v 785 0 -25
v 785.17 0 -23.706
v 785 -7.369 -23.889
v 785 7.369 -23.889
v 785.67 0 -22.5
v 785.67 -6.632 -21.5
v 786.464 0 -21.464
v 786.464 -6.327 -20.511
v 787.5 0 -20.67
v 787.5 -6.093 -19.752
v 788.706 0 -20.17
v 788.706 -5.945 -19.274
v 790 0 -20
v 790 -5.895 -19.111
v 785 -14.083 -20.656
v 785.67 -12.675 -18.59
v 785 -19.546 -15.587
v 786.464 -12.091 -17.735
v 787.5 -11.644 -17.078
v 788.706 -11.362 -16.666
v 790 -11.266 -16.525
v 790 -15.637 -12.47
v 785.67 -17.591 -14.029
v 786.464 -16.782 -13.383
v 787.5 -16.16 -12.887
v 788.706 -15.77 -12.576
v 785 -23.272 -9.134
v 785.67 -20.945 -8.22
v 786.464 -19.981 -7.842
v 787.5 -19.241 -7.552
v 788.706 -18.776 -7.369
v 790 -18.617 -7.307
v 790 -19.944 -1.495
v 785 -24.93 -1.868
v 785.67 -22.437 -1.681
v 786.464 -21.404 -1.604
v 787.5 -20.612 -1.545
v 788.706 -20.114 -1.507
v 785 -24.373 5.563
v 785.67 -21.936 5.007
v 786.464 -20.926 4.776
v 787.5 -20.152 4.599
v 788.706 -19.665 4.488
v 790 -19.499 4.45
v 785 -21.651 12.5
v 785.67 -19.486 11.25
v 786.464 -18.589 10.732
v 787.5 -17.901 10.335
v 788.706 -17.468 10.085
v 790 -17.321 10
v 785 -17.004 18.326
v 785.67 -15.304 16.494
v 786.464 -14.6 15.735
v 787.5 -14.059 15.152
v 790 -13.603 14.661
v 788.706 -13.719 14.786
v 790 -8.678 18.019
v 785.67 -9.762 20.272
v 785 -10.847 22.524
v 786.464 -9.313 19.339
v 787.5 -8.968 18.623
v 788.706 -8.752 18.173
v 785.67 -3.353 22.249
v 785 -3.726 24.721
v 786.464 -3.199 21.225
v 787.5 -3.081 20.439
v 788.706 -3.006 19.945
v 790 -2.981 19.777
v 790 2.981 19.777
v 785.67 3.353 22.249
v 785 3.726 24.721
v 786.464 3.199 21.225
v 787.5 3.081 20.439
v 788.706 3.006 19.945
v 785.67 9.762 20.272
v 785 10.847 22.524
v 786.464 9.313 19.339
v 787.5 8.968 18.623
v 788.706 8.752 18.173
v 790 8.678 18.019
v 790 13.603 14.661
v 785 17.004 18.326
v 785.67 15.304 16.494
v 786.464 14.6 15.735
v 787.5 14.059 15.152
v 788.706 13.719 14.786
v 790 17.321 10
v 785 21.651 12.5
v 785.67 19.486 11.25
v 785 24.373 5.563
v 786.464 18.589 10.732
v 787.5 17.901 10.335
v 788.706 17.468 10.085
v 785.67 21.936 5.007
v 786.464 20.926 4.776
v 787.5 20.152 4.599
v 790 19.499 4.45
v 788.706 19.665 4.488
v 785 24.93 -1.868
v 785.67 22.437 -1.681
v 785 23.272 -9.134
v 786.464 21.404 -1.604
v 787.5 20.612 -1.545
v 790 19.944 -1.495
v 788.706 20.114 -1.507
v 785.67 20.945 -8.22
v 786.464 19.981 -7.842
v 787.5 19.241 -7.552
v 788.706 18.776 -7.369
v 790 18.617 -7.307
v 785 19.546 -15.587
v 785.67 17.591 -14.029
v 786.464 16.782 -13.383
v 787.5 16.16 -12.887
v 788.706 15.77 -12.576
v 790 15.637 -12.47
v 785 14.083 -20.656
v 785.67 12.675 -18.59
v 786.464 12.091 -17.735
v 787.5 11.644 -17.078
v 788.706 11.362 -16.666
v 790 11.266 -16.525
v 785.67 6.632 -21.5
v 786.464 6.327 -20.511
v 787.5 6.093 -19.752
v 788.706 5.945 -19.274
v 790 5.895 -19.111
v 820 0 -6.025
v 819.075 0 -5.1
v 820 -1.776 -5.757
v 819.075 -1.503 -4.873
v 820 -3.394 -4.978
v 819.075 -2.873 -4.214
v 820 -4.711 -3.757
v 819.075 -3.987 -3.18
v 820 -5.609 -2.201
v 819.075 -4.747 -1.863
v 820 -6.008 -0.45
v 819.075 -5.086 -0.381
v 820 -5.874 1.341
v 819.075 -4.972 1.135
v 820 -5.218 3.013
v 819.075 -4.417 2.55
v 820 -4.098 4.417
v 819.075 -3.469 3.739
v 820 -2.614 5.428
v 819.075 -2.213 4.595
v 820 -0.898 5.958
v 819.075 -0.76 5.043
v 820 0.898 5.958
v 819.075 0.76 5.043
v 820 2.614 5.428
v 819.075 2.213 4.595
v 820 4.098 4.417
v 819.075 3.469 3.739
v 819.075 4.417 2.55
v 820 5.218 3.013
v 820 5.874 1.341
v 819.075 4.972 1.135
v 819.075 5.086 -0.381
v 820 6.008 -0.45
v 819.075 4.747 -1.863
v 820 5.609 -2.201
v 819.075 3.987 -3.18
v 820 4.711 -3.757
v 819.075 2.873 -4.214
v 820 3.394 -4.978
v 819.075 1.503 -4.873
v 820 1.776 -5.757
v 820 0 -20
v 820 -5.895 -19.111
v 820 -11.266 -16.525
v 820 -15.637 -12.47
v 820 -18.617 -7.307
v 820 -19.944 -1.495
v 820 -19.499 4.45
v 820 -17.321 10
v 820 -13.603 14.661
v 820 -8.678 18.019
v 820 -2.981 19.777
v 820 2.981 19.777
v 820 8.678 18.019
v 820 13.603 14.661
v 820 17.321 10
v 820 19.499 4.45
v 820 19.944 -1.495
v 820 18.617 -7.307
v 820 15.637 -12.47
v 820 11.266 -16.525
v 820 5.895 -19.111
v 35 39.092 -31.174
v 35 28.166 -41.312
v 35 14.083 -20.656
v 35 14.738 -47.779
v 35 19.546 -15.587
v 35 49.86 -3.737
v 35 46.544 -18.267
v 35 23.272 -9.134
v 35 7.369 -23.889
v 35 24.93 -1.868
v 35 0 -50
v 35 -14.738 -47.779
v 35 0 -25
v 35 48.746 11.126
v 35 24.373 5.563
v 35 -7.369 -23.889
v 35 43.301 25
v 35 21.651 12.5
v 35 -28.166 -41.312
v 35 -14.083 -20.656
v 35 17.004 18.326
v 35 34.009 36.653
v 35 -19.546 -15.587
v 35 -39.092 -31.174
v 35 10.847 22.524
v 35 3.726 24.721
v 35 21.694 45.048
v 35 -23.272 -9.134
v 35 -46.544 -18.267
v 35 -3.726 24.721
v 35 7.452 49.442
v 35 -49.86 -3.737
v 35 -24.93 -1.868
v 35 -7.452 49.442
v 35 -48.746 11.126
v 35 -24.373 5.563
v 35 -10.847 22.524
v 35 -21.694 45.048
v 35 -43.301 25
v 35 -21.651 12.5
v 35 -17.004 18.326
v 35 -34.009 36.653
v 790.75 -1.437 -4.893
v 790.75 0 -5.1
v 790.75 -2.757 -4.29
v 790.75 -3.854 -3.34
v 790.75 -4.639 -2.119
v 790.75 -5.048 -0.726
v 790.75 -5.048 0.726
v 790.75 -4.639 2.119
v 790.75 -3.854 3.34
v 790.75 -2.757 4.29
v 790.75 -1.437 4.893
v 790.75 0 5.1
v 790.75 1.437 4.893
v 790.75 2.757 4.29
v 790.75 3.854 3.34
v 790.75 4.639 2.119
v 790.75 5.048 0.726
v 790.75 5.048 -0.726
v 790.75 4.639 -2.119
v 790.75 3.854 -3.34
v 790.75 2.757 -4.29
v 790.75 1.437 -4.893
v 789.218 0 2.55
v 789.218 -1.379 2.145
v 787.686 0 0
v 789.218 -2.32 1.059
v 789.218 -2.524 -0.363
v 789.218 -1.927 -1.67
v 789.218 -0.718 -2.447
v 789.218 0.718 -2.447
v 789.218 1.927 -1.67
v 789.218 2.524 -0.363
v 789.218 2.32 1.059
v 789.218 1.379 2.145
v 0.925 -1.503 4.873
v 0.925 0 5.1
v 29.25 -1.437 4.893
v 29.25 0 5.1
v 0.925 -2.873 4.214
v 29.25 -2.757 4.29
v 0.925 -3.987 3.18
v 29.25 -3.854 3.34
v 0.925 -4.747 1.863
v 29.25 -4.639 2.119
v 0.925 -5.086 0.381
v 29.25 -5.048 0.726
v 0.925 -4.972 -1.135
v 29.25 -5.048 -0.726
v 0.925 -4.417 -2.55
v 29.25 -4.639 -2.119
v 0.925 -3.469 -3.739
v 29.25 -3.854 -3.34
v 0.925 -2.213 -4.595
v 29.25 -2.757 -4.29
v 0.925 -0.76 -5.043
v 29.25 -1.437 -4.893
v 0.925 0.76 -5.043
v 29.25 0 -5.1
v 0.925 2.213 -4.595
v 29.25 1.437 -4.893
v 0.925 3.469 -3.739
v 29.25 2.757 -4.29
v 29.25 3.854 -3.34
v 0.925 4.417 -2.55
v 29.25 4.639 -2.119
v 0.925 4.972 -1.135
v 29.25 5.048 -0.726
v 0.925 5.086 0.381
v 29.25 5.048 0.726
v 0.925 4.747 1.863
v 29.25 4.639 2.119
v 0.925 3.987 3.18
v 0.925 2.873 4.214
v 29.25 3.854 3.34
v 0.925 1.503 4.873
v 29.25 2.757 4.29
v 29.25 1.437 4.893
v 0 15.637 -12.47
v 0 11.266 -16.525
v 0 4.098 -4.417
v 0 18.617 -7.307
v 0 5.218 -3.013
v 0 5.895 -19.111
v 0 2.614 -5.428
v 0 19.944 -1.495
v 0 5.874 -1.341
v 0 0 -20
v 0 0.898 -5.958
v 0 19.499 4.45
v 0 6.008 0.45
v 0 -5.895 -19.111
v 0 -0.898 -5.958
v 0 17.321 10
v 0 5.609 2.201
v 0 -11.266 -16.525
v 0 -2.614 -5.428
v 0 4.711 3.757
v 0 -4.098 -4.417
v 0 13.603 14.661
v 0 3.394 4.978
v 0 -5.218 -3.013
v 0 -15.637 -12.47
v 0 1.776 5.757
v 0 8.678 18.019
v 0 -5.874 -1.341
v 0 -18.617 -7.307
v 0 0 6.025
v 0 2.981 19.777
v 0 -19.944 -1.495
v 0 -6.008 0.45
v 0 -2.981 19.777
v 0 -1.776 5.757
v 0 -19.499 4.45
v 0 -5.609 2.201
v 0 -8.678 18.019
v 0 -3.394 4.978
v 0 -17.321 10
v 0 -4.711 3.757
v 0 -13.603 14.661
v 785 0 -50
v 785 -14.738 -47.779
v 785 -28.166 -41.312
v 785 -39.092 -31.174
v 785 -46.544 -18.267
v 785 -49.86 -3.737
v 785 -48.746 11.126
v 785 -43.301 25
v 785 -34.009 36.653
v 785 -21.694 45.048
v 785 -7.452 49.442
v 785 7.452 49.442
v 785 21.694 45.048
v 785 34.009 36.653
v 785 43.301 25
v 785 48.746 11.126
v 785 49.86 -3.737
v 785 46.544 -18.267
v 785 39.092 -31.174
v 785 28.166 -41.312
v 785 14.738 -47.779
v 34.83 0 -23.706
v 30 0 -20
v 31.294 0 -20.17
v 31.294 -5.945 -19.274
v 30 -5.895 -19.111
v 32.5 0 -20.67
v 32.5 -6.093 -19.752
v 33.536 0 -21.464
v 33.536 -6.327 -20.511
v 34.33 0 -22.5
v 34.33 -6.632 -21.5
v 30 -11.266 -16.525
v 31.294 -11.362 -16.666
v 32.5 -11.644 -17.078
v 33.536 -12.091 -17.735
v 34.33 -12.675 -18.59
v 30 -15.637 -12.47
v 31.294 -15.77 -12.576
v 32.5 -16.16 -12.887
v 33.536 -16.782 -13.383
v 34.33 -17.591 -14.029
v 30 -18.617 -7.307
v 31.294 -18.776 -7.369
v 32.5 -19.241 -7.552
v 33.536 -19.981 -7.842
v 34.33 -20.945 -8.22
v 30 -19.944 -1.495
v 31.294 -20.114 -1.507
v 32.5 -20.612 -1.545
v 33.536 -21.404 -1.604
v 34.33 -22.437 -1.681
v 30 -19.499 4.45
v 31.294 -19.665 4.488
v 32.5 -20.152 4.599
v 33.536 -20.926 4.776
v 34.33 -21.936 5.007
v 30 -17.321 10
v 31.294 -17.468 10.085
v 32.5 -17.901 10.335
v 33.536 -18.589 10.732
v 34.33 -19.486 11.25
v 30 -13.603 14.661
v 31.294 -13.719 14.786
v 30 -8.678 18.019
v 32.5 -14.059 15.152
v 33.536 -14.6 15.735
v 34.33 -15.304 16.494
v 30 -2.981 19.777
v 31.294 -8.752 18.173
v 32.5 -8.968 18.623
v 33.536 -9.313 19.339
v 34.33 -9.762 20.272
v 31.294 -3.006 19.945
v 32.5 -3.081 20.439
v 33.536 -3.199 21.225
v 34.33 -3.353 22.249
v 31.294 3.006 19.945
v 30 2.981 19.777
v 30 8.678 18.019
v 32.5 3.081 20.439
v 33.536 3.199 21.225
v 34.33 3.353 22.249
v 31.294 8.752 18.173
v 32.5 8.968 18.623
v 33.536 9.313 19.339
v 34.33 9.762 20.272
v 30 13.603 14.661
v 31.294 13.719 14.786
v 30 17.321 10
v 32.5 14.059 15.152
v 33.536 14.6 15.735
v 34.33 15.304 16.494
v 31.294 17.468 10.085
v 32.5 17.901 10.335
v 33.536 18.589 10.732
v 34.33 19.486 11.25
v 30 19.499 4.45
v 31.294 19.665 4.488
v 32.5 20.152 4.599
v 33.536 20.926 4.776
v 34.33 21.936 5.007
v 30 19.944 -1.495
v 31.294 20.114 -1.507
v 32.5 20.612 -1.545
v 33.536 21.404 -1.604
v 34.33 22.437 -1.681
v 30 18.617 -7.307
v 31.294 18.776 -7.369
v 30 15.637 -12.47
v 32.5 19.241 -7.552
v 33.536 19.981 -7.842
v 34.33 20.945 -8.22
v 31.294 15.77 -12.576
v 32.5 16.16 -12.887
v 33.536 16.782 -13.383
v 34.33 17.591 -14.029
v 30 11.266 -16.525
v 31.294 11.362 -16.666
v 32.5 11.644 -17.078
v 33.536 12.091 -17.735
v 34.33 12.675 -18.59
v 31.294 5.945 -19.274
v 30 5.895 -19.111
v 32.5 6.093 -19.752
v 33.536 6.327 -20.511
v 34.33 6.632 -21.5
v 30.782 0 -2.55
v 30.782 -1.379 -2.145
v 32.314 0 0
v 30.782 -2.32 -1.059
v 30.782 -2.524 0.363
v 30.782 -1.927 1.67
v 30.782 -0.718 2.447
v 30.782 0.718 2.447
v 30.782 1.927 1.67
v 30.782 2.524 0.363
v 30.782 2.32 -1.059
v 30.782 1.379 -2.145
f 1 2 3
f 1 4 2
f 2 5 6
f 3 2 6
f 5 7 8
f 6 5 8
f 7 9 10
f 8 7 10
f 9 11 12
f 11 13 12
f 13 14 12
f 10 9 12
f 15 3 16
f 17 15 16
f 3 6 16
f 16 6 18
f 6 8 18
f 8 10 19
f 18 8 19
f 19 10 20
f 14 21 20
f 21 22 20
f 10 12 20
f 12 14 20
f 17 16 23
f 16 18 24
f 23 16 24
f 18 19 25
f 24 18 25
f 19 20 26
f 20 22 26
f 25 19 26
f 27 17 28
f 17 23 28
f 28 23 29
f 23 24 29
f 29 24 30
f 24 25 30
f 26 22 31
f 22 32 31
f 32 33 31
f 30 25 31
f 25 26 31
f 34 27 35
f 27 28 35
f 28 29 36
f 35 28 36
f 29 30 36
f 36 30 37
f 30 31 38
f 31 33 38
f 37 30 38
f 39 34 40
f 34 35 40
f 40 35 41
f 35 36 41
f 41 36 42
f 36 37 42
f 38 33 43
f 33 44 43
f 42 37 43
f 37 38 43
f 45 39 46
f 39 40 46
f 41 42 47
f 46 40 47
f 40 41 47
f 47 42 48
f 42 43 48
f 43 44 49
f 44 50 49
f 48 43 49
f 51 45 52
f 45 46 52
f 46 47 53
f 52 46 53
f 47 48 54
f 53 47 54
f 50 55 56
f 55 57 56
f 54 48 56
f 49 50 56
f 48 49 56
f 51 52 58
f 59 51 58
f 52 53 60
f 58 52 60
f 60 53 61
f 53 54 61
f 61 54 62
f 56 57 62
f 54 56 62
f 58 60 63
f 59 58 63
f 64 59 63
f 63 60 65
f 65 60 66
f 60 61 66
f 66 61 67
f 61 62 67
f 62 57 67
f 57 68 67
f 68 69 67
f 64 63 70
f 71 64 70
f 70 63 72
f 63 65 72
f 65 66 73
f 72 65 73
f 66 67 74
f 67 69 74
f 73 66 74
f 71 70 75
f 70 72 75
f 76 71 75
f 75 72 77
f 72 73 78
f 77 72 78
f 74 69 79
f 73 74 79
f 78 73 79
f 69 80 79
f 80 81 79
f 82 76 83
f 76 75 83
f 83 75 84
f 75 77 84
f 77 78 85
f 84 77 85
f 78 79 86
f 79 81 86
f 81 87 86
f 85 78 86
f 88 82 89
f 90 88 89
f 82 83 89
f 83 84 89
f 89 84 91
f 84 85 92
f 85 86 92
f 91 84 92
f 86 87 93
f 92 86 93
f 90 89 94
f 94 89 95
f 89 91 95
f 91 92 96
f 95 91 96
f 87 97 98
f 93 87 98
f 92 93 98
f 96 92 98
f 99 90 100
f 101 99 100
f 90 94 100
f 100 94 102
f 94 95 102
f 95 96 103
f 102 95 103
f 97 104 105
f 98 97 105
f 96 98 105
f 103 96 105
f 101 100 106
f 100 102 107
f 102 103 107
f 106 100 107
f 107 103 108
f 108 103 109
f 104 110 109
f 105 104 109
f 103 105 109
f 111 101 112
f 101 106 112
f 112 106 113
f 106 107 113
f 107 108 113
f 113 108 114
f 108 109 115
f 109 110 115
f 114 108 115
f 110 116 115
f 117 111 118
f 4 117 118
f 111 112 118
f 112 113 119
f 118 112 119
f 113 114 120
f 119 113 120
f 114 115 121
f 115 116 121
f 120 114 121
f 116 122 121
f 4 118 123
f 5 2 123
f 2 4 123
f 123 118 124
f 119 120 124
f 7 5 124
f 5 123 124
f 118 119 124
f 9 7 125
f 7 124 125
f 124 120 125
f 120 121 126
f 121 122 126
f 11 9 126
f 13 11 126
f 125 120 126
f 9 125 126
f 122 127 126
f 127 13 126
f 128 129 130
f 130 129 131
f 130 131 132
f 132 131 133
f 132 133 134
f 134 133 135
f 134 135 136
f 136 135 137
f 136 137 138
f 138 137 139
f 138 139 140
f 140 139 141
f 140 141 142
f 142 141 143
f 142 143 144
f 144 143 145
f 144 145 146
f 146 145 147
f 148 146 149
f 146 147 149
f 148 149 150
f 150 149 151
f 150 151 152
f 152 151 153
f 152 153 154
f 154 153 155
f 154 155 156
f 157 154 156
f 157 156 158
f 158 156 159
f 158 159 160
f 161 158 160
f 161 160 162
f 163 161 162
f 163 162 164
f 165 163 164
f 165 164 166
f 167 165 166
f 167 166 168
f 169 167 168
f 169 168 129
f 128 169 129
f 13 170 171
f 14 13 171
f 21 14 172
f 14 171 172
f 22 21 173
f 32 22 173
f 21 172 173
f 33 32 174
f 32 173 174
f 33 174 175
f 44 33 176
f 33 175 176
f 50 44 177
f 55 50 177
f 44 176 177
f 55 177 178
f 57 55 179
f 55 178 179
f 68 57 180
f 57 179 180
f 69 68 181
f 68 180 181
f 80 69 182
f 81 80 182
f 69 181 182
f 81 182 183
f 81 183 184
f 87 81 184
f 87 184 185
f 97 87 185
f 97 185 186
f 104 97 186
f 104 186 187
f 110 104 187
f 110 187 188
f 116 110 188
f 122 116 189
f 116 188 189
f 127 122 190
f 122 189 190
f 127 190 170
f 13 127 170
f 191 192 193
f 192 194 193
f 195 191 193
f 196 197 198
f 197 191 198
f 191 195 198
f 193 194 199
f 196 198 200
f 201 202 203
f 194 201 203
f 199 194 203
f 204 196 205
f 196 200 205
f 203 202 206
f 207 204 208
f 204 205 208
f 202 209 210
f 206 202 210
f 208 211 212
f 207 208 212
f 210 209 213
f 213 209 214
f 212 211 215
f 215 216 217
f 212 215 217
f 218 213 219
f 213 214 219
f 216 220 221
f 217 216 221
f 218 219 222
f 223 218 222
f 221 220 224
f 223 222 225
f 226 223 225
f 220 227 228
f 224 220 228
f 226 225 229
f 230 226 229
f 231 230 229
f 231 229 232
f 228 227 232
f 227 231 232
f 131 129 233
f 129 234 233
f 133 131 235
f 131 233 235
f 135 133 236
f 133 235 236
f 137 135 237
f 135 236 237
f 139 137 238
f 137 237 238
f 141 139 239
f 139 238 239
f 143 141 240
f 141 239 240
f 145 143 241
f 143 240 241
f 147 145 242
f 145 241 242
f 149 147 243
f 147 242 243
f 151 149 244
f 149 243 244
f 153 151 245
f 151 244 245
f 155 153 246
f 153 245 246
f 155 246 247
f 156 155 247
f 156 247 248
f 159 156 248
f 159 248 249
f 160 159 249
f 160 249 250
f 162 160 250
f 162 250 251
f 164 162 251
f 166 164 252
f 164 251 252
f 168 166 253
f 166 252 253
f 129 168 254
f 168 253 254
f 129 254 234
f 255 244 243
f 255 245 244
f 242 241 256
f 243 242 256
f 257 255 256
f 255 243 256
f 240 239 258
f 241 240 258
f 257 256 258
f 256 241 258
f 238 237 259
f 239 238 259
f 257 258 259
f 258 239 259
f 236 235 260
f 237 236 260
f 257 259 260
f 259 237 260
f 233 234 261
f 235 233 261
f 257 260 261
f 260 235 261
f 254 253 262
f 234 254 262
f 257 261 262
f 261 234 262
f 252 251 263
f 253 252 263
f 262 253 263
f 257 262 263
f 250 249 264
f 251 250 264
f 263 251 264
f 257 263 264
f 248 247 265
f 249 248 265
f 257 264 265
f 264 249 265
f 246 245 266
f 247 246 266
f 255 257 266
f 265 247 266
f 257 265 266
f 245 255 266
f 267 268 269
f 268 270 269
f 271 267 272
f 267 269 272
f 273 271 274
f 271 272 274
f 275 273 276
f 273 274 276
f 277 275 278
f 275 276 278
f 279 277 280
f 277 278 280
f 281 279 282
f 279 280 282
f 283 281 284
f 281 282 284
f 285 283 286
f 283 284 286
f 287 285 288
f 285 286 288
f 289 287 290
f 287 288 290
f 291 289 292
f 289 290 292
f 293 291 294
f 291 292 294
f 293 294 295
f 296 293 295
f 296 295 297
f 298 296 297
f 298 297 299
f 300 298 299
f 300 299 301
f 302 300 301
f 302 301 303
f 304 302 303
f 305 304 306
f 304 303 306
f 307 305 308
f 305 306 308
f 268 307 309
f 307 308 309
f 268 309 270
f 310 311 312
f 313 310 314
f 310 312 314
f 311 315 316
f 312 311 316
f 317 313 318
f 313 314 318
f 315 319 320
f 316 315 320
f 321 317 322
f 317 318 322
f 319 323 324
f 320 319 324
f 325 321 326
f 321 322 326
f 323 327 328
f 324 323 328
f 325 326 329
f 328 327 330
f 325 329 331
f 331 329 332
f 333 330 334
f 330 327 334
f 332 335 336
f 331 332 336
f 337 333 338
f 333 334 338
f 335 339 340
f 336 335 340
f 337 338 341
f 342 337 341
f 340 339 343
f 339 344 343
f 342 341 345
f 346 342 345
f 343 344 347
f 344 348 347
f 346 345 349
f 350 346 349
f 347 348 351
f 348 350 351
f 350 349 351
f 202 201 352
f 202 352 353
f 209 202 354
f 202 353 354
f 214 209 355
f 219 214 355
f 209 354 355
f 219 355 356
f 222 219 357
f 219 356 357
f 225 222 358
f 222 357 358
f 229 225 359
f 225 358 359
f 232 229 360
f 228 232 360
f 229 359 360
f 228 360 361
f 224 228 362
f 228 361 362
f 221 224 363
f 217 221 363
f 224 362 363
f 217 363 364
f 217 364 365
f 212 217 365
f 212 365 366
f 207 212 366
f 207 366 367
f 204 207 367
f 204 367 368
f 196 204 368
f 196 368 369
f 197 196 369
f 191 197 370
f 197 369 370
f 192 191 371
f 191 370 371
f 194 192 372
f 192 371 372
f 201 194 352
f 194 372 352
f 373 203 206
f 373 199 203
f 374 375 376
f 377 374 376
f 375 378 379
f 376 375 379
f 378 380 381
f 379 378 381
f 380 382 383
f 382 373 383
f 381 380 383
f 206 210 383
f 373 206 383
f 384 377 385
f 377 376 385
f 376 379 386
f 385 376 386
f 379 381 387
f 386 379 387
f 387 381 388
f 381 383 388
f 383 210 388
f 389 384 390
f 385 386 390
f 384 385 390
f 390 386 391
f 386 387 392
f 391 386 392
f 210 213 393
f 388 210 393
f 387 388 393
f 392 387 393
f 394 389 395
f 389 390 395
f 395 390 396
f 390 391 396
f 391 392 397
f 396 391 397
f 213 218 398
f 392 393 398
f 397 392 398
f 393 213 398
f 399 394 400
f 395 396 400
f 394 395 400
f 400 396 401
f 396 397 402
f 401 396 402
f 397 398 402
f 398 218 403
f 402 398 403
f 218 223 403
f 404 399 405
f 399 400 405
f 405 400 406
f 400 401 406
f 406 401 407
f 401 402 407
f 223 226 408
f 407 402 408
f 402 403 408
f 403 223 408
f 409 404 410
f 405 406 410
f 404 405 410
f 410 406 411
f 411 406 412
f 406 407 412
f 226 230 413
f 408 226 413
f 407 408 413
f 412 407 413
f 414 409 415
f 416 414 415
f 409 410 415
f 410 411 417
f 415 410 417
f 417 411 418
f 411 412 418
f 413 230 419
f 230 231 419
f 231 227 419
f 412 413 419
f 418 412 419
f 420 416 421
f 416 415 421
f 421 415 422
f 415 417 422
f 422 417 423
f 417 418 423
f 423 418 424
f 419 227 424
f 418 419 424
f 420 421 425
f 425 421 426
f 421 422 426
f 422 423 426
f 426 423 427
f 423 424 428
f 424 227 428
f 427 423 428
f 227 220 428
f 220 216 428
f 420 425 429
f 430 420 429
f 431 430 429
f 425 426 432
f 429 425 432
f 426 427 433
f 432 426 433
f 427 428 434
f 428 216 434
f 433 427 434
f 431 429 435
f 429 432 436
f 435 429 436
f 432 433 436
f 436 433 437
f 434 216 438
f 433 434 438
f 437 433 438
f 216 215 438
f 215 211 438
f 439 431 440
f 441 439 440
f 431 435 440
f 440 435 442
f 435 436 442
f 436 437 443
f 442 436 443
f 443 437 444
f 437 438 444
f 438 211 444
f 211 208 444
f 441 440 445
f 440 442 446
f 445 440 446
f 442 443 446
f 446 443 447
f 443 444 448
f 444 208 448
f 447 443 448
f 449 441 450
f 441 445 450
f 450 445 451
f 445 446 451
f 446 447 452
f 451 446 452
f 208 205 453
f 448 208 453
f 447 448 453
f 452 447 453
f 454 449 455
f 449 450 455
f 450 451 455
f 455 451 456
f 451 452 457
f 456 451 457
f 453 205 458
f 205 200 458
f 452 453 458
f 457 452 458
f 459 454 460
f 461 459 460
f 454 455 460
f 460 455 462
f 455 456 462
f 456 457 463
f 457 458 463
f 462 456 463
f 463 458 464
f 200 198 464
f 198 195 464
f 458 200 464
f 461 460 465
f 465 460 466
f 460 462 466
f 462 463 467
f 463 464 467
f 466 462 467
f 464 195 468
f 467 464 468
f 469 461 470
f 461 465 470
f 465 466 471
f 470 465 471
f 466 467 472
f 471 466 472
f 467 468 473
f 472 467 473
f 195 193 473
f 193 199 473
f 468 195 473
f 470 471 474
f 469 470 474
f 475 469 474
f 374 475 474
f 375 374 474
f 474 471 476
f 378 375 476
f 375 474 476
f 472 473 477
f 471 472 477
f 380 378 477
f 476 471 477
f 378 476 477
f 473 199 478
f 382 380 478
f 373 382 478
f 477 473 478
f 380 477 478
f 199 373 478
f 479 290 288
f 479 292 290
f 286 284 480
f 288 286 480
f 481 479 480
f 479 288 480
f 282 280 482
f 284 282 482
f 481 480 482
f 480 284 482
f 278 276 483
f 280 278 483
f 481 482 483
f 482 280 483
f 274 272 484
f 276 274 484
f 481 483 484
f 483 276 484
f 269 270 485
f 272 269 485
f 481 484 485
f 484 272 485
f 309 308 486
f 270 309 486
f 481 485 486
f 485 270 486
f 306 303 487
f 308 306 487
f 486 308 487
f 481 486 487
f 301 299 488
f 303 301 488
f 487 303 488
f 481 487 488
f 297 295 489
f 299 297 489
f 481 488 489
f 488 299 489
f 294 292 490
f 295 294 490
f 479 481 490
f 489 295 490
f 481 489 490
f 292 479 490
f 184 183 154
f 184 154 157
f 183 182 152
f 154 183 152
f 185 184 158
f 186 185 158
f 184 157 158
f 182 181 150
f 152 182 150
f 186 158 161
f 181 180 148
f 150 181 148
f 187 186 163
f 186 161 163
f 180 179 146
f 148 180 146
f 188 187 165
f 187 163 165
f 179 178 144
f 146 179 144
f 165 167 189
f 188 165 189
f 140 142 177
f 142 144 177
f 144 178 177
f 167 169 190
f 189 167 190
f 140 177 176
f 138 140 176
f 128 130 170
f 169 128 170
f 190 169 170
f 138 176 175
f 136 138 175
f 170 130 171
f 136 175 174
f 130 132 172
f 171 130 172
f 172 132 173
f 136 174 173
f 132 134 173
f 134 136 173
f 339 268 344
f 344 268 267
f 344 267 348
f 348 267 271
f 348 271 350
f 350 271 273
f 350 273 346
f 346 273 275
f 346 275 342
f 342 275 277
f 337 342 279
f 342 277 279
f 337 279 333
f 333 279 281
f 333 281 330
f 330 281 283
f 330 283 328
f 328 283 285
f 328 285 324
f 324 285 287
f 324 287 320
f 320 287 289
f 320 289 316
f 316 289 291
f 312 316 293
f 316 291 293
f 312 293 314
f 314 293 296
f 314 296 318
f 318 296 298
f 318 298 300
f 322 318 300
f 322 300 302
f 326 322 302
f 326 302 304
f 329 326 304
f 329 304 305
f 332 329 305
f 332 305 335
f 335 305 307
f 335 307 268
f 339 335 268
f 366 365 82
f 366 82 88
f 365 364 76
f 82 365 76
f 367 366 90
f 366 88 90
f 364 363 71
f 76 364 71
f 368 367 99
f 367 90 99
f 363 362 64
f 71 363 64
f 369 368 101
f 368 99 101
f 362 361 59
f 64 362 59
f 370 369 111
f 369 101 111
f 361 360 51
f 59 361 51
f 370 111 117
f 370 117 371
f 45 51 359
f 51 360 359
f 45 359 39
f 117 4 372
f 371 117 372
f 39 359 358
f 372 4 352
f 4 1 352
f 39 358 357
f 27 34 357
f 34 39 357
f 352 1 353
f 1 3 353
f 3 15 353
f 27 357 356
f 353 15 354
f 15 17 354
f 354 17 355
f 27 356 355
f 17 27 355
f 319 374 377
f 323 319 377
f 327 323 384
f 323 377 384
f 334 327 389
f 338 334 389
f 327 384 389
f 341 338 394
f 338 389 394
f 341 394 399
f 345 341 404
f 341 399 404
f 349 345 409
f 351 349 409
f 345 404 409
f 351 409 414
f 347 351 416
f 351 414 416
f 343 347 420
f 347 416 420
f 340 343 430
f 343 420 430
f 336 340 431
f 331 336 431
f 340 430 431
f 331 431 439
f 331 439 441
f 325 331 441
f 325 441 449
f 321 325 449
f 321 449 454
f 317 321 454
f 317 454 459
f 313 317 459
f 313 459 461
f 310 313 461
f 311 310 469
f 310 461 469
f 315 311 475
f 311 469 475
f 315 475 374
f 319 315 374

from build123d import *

# Parameters (mm, degrees)
FILLET1_R                              = 5
M12_TAPPED_HOLE4_D                     = 10.2
M12_TAPPED_HOLE4_DEPTH                 = 29.25
M12_TAPPED_HOLE4_CSINK_D               = 12.05
M12_TAPPED_HOLE4_CSINK_ANGLE           = 90
M12_TAPPED_HOLE4_TIP                   = 3.064389157
M12_TAPPED_HOLE4_ON_FACE_2_D           = 10.2
M12_TAPPED_HOLE4_ON_FACE_2_DEPTH       = 29.25
M12_TAPPED_HOLE4_ON_FACE_2_CSINK_D     = 12.05
M12_TAPPED_HOLE4_ON_FACE_2_CSINK_ANGLE = 90
M12_TAPPED_HOLE4_ON_FACE_2_TIP         = 3.064389157


with BuildPart() as part:
    # Sketch1 → Revolve1 (revolve)
    with BuildSketch(Plane.XY, mode=Mode.PRIVATE) as revolve1_sk:
        Polygon((0, 0), (0, 20), (35, 20), (35, 50), (785, 50), (785, 20), (820, 20), (820, 0), align=None)
    revolve(revolve1_sk.sketch.rotate(Axis((820, 0, 0), (-1, 0, 0)), 90), axis=Axis((820, 0, 0), (-1, 0, 0)))

    # Fillet1
    fillet1_edges = [part.edges().sort_by_distance(p)[0] for p in [
        (785, 0, 20),
        (35, 0, 20),
    ]]
    fillet(fillet1_edges, radius=FILLET1_R)

    # M12 Tapped Hole4
    with Locations(Plane(origin=(0, 0, 0), x_dir=(0, 0, -1), z_dir=(-1, 0, 0))):
        with Locations((0, 0)):
            CounterSinkHole(M12_TAPPED_HOLE4_D / 2, M12_TAPPED_HOLE4_CSINK_D / 2, depth=M12_TAPPED_HOLE4_DEPTH, counter_sink_angle=M12_TAPPED_HOLE4_CSINK_ANGLE)
            with Locations((0, 0, -(M12_TAPPED_HOLE4_DEPTH + M12_TAPPED_HOLE4_TIP / 2))):  # 118° drill point
                Cone(0, M12_TAPPED_HOLE4_D / 2, M12_TAPPED_HOLE4_TIP, mode=Mode.SUBTRACT)

    # M12 Tapped Hole4 on face 2
    with Locations(Plane(origin=(820, 0, 0), x_dir=(0, 0, 1), z_dir=(1, 0, 0))):
        with Locations((0, 0)):
            CounterSinkHole(M12_TAPPED_HOLE4_ON_FACE_2_D / 2, M12_TAPPED_HOLE4_ON_FACE_2_CSINK_D / 2, depth=M12_TAPPED_HOLE4_ON_FACE_2_DEPTH, counter_sink_angle=M12_TAPPED_HOLE4_ON_FACE_2_CSINK_ANGLE)
            with Locations((0, 0, -(M12_TAPPED_HOLE4_ON_FACE_2_DEPTH + M12_TAPPED_HOLE4_ON_FACE_2_TIP / 2))):  # 118° drill point
                Cone(0, M12_TAPPED_HOLE4_ON_FACE_2_D / 2, M12_TAPPED_HOLE4_ON_FACE_2_TIP, mode=Mode.SUBTRACT)


solid = part.part
